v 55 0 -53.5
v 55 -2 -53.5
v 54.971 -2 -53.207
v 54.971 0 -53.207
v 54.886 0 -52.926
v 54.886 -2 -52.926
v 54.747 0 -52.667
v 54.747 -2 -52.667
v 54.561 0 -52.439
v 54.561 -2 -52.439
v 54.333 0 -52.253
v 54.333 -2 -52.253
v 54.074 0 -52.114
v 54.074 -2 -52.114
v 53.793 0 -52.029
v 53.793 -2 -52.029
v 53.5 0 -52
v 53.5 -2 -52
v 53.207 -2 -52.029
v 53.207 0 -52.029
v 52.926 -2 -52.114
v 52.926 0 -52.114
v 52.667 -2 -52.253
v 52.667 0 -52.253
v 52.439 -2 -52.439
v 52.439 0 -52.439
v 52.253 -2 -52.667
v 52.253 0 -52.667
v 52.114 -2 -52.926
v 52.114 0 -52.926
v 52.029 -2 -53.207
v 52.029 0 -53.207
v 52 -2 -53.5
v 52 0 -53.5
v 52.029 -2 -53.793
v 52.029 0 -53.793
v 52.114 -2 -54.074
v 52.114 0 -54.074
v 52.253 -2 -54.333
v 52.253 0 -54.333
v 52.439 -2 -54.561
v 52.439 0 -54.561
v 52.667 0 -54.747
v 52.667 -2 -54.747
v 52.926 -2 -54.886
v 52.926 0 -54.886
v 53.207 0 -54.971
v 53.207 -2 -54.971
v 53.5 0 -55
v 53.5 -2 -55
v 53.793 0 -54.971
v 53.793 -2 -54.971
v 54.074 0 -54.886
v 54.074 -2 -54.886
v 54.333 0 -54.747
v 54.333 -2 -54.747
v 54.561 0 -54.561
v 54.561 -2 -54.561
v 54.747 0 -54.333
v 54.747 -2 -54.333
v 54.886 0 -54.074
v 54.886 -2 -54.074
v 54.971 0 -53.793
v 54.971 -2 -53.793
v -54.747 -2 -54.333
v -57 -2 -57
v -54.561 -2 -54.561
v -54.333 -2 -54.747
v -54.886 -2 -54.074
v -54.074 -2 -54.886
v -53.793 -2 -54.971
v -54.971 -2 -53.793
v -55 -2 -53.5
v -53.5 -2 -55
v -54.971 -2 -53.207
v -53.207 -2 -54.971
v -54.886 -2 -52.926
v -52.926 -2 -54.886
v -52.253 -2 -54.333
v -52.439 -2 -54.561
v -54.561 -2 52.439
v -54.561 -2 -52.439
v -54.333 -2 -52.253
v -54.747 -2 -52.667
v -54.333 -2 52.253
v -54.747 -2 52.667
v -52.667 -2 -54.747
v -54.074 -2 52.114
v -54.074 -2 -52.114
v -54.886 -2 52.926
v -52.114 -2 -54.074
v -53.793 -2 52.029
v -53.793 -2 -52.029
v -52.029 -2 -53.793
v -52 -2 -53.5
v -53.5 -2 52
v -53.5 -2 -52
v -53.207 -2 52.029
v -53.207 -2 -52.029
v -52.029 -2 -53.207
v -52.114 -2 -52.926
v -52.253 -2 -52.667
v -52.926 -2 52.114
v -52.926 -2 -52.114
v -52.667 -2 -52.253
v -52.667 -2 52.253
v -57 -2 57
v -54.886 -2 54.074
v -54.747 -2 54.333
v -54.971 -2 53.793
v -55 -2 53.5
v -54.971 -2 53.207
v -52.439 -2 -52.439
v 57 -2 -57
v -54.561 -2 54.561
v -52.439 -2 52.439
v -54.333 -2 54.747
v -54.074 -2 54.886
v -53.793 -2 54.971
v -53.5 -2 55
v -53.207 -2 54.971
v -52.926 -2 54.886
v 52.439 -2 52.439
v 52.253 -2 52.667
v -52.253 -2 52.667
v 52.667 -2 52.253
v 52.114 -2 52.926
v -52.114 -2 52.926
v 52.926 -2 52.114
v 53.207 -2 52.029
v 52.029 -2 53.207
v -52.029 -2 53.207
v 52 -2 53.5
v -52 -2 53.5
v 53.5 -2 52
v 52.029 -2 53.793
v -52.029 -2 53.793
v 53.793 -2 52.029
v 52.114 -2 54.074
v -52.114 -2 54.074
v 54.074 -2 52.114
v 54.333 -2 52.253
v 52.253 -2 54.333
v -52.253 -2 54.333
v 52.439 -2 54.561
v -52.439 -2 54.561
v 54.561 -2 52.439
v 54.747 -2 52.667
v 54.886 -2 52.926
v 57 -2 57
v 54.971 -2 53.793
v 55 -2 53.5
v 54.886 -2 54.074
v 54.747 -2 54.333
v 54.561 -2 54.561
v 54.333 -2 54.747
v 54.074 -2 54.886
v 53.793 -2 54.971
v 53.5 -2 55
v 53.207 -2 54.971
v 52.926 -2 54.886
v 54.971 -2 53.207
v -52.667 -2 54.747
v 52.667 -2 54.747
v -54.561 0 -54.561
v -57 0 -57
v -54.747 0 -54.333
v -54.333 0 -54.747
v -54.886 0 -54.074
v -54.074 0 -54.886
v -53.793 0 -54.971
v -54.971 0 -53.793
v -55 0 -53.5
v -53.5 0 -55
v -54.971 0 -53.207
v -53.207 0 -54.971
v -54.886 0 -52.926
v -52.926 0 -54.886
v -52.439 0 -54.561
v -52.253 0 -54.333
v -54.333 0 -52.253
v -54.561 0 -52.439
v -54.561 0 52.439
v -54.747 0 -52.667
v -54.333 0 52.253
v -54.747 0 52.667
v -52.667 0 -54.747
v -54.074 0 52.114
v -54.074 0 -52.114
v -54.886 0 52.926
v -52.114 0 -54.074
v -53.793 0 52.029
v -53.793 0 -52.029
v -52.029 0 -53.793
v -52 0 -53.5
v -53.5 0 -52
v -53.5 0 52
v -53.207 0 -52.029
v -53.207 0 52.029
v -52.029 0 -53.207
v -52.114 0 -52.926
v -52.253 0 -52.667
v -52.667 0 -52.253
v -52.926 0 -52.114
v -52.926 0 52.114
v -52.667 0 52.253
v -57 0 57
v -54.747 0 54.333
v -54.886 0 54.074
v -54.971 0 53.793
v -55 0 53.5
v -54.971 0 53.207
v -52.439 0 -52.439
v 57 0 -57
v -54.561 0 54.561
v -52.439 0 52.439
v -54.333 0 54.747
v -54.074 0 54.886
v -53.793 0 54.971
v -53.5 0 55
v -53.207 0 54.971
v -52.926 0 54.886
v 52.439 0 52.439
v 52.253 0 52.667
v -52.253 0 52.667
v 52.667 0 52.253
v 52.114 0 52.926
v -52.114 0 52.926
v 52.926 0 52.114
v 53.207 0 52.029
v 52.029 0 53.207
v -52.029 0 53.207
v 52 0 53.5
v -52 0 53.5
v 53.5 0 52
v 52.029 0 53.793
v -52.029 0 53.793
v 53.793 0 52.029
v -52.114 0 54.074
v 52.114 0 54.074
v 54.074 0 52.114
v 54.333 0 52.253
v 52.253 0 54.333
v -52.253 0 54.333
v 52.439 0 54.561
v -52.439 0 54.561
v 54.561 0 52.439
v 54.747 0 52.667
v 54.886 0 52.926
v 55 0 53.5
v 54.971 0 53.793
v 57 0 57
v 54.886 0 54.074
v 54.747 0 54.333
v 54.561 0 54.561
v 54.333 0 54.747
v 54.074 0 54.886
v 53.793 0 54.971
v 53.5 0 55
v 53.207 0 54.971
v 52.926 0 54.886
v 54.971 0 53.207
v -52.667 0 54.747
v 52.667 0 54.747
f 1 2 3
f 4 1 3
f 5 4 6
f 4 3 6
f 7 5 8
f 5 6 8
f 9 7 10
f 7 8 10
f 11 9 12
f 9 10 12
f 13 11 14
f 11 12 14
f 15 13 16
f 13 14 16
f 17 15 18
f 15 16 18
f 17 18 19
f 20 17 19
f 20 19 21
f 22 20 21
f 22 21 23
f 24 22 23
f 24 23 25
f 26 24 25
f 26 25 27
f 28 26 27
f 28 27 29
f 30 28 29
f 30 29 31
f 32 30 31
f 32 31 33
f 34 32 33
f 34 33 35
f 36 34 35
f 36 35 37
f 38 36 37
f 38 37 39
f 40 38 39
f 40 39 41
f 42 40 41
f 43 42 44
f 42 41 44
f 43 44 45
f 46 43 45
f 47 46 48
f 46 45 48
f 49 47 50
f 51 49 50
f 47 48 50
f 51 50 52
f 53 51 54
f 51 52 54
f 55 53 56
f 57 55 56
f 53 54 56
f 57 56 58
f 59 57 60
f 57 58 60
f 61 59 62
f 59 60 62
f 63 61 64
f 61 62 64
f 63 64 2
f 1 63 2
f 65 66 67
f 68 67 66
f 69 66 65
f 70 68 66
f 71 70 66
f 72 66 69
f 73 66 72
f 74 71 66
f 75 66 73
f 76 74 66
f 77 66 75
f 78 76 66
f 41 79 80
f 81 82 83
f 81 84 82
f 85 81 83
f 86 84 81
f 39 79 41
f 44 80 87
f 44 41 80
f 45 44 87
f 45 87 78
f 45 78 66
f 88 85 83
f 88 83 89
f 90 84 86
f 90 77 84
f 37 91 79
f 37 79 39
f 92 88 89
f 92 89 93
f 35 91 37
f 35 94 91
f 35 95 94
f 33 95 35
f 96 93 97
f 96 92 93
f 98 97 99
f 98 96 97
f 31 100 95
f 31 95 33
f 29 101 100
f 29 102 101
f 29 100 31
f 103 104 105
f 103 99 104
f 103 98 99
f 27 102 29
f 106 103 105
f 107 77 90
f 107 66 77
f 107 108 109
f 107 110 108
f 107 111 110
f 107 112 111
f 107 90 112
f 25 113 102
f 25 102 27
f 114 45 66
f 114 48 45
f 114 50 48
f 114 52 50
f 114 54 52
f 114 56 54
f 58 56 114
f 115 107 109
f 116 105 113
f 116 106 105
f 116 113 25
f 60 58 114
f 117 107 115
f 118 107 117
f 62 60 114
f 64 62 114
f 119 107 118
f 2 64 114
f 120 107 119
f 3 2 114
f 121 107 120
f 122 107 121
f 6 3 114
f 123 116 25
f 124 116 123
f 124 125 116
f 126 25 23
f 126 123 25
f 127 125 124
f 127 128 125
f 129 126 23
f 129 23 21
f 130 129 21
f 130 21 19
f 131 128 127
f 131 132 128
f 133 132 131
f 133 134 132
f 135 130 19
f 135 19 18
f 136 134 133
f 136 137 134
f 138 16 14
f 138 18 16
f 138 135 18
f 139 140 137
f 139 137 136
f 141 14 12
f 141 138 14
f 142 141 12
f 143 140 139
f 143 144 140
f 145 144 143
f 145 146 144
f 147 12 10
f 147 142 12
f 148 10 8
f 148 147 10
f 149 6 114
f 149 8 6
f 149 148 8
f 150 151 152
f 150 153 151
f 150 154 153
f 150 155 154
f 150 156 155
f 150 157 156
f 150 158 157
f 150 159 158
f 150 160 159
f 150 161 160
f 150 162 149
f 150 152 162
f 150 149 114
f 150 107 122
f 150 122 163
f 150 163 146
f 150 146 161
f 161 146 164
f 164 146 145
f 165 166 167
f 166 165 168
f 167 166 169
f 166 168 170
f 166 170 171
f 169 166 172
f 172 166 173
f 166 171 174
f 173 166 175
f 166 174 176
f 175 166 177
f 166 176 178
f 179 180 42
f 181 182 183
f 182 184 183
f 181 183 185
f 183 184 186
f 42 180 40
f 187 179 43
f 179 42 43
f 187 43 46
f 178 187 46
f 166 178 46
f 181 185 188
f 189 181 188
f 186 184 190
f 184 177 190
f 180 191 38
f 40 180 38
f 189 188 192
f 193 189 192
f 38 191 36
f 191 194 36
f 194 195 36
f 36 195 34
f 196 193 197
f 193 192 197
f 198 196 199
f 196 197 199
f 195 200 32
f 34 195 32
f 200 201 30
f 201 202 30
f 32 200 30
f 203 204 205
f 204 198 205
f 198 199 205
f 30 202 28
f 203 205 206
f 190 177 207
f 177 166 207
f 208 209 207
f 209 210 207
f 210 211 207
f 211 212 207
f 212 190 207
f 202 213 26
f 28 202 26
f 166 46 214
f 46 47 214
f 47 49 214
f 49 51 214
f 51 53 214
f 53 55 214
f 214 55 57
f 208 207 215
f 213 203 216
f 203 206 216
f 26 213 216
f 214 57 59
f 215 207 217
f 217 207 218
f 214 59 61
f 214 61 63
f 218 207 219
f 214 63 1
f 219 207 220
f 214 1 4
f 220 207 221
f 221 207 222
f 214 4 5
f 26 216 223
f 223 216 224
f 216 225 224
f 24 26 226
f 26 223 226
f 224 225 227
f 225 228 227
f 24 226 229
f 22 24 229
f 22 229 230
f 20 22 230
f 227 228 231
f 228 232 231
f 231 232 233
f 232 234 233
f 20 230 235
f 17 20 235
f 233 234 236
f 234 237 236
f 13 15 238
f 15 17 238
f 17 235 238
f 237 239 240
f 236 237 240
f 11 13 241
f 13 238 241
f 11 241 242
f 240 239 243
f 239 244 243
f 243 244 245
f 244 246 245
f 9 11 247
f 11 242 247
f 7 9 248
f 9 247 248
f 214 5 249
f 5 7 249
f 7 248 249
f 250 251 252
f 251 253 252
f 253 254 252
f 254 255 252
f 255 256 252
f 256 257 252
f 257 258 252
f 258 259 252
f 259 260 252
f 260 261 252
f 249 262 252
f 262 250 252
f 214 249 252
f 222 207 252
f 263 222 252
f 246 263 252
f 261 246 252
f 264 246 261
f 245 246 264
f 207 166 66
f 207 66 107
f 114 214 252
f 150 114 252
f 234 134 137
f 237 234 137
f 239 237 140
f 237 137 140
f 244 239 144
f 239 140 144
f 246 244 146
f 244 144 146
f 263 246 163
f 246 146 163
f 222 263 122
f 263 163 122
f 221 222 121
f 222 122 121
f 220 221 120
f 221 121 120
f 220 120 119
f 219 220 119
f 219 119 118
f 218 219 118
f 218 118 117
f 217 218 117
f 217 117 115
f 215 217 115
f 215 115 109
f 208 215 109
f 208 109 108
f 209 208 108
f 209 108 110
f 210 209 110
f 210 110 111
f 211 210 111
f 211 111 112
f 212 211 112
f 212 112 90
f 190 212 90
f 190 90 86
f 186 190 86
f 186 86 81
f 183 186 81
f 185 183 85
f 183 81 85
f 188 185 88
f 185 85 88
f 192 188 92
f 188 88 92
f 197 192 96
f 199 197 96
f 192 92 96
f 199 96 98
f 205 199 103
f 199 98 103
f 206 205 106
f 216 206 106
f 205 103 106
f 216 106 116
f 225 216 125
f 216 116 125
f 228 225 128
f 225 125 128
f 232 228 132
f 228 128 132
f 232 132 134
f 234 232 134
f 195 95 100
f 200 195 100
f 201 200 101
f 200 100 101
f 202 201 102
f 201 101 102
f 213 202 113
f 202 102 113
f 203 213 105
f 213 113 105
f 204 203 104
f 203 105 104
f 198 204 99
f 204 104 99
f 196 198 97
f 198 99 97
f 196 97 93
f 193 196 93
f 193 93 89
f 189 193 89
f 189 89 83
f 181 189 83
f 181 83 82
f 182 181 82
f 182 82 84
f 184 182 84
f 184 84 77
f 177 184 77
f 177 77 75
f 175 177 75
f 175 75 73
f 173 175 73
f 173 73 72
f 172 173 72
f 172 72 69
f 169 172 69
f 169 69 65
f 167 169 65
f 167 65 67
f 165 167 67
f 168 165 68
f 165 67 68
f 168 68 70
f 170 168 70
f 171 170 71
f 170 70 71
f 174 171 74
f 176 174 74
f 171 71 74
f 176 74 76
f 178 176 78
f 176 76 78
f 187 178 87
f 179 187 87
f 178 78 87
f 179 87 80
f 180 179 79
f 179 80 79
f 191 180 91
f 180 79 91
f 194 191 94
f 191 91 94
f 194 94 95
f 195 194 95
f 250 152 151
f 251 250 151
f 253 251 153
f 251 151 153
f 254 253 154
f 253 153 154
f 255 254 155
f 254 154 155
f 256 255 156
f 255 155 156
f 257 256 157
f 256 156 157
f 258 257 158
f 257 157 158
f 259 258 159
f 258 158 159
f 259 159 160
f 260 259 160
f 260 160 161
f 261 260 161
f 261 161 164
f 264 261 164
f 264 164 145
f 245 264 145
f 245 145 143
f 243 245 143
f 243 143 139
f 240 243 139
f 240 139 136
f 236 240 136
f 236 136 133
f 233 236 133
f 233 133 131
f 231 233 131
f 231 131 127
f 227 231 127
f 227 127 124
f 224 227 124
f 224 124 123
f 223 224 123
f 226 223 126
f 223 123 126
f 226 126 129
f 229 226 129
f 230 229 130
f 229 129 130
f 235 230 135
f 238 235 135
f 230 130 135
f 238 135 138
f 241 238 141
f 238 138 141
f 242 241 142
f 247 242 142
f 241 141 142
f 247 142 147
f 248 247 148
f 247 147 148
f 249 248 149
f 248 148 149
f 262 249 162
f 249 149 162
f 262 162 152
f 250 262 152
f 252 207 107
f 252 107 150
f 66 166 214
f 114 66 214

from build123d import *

# Parameters (mm, degrees)
F0_W     = 114
F0_H     = 114
F1_DEPTH = 2
F2_R     = 1.5
F3_DEPTH = 2.001
F4_DEPTH = 2.001


with BuildPart() as f1:
    # F0 (on Front) → F1 (new body)
    with BuildSketch(Plane.XZ):
        Rectangle(F0_W, F0_H)
    extrude(amount=F1_DEPTH)

    # F2 (on face) → F3 (cut, through all)
    with BuildSketch(Plane.XZ.offset(2)):
        with Locations((-53.5, 53.5)):
            Circle(F2_R)
    extrude(amount=-F3_DEPTH, mode=Mode.SUBTRACT)

    # F2 (on face) → F4 (cut, through all)
    with BuildSketch(Plane.XZ.offset(2)):
        with Locations((-53.5, 53.5)):
            Circle(F2_R)
        with Locations((53.5, 53.5)):
            Circle(F2_R)
        with Locations((53.5, -53.5)):
            Circle(F2_R)
        with Locations((-53.5, -53.5)):
            Circle(F2_R)
    extrude(amount=-F4_DEPTH, mode=Mode.SUBTRACT)


solid = f1.part
